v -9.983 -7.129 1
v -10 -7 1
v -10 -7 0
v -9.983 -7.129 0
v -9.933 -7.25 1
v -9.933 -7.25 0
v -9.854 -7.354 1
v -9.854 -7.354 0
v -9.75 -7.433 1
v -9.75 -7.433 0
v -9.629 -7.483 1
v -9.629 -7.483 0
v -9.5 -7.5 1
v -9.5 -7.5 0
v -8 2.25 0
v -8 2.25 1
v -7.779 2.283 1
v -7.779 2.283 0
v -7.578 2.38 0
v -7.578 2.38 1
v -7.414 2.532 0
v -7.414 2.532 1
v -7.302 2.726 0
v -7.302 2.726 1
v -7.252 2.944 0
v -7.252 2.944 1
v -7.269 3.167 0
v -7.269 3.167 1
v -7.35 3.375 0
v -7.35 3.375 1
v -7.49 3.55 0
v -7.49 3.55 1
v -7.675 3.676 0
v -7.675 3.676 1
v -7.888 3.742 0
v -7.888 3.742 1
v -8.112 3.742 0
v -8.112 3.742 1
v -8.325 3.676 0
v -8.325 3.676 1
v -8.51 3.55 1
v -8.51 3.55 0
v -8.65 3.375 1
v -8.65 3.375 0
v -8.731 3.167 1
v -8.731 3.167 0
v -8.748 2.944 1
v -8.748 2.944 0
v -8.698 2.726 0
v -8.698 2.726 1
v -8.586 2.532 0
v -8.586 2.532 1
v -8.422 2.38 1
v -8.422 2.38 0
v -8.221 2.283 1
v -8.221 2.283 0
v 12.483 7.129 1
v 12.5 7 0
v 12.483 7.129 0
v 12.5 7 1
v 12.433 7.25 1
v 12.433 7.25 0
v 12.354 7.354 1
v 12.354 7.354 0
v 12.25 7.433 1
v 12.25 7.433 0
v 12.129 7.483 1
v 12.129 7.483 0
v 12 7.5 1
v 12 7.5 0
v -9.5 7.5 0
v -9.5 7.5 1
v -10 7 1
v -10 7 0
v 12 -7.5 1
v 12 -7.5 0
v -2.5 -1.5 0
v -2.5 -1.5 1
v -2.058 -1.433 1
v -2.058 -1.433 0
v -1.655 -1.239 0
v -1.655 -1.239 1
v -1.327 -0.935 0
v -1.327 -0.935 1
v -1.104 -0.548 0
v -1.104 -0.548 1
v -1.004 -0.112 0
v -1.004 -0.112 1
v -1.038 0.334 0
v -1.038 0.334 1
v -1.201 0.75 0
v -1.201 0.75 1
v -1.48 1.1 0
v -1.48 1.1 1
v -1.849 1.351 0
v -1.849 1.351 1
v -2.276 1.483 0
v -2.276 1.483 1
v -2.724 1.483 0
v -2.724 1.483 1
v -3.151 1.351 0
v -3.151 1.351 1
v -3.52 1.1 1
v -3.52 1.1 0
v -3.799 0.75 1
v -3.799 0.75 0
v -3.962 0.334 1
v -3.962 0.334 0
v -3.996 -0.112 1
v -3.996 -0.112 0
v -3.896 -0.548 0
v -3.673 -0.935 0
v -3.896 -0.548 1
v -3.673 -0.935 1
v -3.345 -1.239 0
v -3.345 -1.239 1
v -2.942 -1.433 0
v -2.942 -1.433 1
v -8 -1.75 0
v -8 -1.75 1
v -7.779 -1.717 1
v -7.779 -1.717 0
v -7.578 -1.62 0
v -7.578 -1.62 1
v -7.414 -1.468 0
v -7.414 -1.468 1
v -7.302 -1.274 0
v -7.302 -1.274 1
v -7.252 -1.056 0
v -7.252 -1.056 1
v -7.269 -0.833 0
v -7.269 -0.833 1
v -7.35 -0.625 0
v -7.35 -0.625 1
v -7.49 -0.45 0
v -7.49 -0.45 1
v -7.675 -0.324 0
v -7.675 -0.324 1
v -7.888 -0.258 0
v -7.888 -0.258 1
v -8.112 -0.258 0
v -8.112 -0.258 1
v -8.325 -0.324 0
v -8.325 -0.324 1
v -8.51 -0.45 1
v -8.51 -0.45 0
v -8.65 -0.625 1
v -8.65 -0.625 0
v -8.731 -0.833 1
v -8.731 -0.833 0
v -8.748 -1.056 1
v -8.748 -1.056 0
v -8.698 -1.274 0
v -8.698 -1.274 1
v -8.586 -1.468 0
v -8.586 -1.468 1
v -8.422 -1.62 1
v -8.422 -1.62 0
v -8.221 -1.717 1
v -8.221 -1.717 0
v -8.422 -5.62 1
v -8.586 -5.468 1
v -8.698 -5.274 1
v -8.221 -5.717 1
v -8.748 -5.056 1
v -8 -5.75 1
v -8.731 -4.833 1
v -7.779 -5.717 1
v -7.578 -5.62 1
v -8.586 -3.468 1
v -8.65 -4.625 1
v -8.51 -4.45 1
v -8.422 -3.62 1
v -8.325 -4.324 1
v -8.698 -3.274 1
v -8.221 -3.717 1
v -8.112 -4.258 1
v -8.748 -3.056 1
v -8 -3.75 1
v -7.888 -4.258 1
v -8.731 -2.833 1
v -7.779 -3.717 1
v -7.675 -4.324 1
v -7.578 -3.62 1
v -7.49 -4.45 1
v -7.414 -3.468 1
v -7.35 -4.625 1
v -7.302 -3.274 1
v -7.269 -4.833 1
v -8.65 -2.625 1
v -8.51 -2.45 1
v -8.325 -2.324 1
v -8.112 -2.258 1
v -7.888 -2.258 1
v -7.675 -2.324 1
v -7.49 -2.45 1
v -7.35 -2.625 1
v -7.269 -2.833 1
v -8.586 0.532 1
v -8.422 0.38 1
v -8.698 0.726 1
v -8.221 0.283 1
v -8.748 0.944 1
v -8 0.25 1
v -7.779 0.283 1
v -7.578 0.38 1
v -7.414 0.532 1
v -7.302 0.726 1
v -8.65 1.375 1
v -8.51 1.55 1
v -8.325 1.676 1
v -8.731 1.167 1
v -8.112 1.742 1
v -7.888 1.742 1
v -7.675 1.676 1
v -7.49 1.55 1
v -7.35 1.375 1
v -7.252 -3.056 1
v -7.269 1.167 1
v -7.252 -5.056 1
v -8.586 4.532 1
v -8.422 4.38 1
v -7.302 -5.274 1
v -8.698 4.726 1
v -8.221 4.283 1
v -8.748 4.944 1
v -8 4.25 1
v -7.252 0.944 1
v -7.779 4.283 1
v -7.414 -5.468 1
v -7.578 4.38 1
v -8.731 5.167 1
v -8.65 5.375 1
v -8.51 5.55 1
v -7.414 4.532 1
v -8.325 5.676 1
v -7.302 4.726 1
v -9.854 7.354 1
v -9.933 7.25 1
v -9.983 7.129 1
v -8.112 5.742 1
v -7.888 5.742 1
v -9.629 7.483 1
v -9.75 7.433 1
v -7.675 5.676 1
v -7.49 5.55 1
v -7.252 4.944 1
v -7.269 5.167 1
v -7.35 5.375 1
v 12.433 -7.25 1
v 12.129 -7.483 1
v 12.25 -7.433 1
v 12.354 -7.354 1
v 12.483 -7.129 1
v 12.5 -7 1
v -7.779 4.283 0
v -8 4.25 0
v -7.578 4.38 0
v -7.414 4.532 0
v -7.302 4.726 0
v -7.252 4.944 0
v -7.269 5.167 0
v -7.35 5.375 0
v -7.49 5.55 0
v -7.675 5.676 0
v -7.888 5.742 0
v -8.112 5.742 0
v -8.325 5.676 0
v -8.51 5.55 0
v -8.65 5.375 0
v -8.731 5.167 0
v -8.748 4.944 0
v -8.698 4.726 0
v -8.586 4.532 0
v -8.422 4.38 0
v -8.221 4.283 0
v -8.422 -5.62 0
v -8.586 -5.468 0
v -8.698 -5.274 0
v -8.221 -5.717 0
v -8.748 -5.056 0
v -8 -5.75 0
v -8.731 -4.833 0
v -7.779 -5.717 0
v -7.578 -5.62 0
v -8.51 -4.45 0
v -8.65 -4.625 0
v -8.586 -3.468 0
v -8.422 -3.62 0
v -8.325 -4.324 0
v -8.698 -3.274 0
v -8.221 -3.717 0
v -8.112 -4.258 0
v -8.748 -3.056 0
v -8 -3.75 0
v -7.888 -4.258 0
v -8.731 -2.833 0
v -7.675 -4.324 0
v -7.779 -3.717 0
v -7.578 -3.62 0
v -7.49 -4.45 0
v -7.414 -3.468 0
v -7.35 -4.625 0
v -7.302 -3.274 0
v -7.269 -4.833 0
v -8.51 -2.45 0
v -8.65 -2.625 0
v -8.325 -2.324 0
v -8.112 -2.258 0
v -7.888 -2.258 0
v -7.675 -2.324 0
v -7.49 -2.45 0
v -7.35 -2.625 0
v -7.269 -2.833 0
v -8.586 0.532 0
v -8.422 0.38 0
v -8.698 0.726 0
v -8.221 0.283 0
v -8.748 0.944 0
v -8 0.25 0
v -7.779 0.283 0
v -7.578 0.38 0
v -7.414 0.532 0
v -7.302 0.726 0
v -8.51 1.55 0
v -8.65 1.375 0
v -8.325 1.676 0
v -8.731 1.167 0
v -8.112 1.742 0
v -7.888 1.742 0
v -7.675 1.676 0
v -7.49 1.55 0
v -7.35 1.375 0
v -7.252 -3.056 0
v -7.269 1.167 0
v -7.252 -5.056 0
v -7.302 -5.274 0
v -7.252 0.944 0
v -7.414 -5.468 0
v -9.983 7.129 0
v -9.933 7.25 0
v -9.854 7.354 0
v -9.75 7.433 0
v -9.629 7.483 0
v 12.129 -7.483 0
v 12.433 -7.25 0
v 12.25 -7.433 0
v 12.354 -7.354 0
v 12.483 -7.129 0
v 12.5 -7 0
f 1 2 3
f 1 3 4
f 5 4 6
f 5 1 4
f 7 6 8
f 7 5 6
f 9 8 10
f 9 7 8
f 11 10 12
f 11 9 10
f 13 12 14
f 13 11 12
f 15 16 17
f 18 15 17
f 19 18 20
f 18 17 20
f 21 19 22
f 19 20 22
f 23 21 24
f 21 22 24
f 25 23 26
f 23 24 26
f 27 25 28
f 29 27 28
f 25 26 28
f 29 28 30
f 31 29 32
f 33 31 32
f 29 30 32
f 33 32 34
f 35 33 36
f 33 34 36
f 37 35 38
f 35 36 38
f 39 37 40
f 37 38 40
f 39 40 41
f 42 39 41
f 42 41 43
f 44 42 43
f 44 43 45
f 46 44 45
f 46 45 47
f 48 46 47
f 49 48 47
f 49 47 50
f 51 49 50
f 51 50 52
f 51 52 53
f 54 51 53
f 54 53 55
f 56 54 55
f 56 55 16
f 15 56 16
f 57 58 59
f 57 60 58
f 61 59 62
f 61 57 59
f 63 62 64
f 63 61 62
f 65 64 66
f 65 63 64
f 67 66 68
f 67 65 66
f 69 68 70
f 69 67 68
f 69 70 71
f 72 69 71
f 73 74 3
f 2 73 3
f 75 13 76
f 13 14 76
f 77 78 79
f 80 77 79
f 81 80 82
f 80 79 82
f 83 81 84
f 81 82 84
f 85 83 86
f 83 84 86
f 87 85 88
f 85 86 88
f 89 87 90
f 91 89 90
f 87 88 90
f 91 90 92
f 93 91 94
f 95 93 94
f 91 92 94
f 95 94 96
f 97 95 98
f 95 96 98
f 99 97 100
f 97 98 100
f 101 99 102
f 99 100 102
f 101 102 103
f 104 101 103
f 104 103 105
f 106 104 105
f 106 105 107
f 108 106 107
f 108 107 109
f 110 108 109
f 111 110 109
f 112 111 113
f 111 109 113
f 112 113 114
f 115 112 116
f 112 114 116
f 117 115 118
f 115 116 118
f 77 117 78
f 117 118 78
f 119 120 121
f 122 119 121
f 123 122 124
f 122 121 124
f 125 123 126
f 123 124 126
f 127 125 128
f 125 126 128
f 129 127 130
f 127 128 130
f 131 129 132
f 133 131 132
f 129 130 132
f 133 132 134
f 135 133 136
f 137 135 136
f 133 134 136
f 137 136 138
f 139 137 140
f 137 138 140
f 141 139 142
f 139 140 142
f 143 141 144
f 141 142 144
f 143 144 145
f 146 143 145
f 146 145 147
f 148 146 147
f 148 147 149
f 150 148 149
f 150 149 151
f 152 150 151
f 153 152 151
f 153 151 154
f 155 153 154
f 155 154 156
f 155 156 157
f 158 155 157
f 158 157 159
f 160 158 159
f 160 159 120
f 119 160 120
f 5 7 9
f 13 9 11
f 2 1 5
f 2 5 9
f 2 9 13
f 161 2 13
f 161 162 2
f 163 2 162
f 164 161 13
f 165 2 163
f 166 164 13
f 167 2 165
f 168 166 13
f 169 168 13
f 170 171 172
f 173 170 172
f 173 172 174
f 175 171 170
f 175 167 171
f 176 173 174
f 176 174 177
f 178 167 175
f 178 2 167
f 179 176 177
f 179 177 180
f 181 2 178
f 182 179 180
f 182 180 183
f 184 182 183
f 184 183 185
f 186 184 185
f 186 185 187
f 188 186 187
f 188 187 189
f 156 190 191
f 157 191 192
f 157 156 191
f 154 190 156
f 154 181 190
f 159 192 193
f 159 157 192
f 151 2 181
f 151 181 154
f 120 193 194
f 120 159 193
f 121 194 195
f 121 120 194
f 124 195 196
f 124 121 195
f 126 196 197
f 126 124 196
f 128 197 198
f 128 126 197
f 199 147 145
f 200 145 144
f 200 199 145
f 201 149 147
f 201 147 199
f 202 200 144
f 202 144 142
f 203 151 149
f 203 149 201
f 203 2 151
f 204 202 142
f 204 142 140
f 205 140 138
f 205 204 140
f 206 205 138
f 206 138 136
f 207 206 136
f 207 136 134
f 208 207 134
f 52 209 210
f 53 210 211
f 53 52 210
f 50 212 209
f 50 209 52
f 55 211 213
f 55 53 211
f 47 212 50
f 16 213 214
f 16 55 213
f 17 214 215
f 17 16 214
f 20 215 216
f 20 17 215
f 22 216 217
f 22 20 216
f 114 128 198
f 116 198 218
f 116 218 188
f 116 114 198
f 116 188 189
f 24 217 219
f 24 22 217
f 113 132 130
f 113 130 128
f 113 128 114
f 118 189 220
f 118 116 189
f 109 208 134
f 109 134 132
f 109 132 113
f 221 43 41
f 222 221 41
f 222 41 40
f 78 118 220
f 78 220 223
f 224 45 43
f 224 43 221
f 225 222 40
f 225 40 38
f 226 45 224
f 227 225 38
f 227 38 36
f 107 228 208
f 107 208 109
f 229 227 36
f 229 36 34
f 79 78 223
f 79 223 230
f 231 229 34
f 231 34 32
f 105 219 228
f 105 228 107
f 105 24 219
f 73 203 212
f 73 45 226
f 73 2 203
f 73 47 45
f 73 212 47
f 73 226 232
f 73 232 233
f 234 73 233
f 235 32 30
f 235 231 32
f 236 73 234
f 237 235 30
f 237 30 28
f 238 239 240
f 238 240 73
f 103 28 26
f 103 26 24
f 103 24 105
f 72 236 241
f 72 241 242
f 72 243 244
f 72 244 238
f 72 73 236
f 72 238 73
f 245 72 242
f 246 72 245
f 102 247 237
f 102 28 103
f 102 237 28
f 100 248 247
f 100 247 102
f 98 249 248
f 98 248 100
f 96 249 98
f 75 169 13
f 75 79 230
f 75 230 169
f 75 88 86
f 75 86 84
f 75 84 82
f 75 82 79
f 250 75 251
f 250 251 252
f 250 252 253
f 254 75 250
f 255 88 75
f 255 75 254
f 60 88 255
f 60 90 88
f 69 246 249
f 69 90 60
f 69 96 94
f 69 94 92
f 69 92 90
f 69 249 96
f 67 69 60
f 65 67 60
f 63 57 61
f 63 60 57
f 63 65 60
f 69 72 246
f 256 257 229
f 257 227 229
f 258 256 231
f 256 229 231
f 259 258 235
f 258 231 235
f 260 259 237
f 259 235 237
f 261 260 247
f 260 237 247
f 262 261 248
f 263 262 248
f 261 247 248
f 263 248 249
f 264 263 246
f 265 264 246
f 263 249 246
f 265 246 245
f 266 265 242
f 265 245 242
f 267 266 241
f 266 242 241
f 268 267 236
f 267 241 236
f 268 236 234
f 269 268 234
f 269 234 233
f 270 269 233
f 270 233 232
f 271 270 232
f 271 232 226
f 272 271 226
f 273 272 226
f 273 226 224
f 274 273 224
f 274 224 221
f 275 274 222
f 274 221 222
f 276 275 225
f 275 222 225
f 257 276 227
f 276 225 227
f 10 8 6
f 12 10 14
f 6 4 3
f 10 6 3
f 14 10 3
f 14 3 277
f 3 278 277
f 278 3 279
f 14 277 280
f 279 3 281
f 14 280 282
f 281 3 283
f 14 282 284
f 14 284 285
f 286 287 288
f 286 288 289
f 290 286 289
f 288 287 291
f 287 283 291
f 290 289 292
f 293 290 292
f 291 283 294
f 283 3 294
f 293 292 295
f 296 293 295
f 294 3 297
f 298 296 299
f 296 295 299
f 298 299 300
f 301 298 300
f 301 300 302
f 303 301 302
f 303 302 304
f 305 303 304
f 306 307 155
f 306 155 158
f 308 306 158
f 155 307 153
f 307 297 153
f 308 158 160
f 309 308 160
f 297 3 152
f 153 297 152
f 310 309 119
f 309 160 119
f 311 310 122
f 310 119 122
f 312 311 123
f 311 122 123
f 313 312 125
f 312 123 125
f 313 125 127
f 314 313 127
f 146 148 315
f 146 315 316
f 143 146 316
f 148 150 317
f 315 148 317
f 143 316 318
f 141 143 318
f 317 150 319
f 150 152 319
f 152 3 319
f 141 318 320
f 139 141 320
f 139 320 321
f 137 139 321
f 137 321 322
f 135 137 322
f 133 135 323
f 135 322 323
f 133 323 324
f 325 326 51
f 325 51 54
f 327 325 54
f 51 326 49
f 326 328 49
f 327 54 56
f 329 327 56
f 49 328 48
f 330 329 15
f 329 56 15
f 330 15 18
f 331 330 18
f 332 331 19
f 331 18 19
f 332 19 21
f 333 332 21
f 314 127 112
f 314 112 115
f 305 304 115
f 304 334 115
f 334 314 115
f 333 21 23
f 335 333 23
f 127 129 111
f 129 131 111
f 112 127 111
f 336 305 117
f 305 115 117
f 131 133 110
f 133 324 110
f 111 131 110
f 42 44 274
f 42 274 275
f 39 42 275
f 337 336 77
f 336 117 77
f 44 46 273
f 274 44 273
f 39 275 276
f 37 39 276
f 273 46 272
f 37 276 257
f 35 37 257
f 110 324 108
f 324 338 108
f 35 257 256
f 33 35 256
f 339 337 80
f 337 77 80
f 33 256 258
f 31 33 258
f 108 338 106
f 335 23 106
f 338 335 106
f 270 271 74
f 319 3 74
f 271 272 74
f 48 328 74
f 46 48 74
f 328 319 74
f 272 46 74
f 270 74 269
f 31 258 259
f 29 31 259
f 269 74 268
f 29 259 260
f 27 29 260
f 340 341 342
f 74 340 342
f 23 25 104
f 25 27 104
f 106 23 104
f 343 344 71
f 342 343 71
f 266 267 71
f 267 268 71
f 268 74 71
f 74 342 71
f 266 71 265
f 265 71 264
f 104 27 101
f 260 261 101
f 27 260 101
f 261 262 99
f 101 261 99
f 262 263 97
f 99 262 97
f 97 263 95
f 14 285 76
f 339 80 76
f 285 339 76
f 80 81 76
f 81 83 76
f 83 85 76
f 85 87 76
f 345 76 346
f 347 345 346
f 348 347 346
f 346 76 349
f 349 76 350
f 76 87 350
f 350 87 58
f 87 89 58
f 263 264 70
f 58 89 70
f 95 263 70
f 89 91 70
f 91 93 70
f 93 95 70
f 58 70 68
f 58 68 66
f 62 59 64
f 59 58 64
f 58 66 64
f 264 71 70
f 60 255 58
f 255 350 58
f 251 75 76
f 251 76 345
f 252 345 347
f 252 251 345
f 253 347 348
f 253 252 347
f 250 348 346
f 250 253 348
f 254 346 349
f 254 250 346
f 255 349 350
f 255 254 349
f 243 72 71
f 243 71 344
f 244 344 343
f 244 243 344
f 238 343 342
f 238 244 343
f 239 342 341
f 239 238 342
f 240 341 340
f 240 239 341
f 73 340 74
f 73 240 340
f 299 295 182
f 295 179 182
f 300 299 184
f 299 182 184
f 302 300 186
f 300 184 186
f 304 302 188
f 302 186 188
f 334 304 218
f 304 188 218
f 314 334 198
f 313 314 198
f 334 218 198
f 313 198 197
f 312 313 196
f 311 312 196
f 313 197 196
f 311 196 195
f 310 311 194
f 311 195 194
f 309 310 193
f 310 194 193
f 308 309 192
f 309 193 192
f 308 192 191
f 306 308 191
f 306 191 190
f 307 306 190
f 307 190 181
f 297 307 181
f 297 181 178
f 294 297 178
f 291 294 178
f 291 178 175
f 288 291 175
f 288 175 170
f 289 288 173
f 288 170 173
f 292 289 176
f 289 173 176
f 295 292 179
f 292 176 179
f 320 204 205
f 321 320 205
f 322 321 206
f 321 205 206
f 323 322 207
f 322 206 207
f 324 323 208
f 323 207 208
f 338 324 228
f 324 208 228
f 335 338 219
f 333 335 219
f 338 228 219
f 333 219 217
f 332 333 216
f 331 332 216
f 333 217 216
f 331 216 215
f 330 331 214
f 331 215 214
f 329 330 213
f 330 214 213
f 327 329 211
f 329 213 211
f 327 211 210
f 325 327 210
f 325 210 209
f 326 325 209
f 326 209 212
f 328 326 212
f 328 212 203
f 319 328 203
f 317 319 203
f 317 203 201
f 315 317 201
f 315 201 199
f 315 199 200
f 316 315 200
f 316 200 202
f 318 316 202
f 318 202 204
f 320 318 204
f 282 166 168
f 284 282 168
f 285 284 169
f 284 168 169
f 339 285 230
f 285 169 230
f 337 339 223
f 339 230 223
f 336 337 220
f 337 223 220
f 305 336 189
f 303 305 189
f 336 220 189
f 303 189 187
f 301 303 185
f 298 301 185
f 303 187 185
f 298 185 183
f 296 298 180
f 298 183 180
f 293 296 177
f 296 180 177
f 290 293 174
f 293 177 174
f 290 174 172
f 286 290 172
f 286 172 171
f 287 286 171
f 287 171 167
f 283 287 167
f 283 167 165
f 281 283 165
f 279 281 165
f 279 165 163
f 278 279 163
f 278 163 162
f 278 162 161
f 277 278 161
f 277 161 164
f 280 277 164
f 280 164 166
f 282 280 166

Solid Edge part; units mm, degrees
sketch "Sketch1" plane through (0, 0, 0) normal (0, 0, 1) x (1, 0, 0)
  line L0 (12.5, 7.5) -> (-10, 7.5)
  line L1 (-10, 7.5) -> (-10, -7.5)
  line L2 (-10, -7.5) -> (12.5, -7.5)
  line L3 (12.5, -7.5) -> (12.5, 7.5)
extrude "Protrusion1" add sketch "Sketch1" along normal blind 1
fillet "Round_1" radius 0.5 4 edges at (12.5, 7.5, 0.5) (12.5, -7.5, 0.5) (-10, -7.5, 0.5) (-10, 7.5, 0.5)
hole "Hole_1" at (-2.5, 0, 1) direction (0, 0, -1) diameter 3 end up to next
hole "Hole_2" at (-8, 5, 1) direction (0, 0, -1) diameter 1.5 end up to next
hole "Hole1" at (-8, 3, 1) direction (0, 0, -1) diameter 1.5 end up to next
hole "Hole2" at (-8, 1, 1) direction (0, 0, -1) diameter 1.5 end up to next
hole "Hole3" at (-8, -1, 1) direction (0, 0, -1) diameter 1.5 end up to next
hole "Hole4" at (-8, -3, 1) direction (0, 0, -1) diameter 1.5 end up to next
hole "Hole5" at (-8, -5, 1) direction (0, 0, -1) diameter 1.5 end up to next
